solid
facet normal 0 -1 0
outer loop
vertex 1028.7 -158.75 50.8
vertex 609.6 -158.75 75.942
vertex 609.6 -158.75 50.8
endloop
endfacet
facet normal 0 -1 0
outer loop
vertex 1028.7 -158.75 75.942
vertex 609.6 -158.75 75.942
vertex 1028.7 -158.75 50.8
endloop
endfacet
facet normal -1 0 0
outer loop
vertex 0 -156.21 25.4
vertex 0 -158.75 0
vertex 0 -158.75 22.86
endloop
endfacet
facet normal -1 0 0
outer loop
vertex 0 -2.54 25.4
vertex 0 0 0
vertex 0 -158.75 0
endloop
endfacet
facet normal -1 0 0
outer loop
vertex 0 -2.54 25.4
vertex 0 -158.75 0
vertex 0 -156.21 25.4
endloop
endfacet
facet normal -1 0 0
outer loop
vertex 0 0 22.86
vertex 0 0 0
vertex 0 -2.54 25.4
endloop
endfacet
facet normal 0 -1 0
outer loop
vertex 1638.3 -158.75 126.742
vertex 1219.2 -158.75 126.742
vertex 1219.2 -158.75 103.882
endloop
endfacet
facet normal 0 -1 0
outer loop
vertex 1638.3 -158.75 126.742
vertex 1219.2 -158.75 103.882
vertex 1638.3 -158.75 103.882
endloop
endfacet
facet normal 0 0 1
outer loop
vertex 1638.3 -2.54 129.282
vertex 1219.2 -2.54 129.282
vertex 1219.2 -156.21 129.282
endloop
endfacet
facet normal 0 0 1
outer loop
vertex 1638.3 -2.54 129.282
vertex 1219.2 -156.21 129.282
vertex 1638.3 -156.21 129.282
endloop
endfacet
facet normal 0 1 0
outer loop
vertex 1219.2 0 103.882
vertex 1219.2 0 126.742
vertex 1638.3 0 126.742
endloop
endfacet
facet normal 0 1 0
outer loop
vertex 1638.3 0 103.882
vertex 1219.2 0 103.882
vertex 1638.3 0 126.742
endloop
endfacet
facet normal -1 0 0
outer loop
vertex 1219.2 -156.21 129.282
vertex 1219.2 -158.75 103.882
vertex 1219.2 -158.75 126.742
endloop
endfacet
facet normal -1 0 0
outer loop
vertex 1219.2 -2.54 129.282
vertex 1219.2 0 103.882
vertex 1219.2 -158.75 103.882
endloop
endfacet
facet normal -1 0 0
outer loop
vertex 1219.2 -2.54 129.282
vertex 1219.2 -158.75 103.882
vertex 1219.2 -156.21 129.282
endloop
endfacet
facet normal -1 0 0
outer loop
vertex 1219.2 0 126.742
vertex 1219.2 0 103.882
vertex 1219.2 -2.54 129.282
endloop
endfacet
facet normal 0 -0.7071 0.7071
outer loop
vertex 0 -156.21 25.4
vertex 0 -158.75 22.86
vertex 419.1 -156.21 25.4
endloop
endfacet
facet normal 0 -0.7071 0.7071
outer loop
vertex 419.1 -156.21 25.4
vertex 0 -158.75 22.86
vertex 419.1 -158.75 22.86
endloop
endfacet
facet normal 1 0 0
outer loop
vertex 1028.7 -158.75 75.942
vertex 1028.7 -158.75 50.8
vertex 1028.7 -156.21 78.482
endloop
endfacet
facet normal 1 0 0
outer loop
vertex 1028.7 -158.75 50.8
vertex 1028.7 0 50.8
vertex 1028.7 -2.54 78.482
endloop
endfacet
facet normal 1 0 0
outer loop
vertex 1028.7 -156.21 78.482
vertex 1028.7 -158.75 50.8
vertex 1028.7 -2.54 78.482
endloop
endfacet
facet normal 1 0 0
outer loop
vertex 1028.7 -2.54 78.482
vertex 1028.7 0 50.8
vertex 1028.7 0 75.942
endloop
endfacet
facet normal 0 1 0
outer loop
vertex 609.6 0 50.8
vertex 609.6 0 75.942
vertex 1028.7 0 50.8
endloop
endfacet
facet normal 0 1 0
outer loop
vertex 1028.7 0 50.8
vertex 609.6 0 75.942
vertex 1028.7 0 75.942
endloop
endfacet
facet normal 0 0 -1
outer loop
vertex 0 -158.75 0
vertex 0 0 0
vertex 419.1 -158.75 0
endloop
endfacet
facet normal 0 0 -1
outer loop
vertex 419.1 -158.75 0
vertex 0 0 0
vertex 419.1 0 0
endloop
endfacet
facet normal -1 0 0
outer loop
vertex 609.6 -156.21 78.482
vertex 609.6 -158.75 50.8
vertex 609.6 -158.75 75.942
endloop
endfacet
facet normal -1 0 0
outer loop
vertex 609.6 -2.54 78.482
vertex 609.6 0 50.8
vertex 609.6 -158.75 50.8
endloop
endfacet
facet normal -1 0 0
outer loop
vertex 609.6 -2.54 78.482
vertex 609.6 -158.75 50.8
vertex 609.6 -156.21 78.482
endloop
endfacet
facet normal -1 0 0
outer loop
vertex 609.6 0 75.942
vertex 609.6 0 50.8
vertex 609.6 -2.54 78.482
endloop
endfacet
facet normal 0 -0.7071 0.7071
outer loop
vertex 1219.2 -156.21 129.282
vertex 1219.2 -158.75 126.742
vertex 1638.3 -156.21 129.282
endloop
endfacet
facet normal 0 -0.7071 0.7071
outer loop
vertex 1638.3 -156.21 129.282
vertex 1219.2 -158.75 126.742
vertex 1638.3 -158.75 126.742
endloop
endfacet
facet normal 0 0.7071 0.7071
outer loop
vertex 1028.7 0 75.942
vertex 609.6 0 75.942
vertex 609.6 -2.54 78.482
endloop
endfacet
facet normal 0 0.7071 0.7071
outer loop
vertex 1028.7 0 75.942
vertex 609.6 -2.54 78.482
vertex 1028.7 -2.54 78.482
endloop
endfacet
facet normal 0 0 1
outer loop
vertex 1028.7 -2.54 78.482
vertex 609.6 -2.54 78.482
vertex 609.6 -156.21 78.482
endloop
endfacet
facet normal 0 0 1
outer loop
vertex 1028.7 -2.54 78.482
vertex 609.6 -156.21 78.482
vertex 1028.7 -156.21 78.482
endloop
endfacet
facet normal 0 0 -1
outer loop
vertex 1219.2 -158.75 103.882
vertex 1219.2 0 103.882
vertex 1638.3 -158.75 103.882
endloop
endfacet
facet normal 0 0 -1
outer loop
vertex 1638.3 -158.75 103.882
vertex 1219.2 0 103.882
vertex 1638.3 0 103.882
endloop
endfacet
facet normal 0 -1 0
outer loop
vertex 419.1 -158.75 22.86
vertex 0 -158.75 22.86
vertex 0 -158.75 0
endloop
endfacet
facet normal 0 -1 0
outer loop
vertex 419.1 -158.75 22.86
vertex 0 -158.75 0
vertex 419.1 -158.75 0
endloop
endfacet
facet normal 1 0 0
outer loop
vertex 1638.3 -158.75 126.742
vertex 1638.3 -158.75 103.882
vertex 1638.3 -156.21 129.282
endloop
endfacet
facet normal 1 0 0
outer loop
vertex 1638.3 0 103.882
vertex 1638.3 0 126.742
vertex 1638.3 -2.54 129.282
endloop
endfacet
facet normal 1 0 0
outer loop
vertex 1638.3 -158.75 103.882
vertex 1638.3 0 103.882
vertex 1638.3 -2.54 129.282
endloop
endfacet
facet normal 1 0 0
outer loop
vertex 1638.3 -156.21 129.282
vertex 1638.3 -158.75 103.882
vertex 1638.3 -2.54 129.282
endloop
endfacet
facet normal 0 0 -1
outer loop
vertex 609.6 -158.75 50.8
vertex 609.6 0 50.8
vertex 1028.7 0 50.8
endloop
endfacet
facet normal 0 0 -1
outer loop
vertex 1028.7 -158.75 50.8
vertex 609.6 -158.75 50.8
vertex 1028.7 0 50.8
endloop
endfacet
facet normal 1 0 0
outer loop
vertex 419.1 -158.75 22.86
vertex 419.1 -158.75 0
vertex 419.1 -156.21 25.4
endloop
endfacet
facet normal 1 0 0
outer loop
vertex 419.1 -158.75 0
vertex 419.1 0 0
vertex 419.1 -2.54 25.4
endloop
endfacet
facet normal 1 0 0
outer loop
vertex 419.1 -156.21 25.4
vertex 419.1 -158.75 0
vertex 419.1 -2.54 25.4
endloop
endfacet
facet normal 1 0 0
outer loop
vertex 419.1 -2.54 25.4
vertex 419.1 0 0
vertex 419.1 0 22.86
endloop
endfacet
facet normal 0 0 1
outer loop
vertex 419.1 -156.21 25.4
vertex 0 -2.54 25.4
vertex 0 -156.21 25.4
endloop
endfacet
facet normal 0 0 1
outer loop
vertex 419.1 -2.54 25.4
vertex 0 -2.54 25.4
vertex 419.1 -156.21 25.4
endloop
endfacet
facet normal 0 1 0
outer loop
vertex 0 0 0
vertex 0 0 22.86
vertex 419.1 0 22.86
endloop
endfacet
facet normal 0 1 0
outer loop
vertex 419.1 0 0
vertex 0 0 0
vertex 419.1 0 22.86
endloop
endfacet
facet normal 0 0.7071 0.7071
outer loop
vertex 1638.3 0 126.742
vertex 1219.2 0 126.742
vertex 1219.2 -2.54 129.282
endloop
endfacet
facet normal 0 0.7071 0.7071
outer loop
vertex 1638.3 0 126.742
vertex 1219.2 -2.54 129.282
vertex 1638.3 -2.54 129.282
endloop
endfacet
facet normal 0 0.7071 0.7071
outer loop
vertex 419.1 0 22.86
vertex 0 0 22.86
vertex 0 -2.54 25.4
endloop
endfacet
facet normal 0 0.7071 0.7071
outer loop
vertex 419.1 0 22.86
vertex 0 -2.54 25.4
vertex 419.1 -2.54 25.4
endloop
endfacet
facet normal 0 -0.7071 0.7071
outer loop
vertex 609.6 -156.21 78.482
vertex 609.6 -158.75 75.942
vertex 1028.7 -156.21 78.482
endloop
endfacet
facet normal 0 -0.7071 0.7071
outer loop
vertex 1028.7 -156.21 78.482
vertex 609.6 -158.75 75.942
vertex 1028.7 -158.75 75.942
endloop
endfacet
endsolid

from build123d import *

# Parameters (mm, degrees)
F0_W     = 419.1
F0_H     = 25.4
F0_H_2   = 27.682158
F1_DEPTH = 158.75
F2_SIZE  = 2.54


with BuildPart() as f1:
    # F0 (on Front) → F1 (new body)
    with BuildSketch(Plane.XZ):
        with Locations((209.55, 12.7)):
            Rectangle(F0_W, F0_H)
        with Locations((819.15, 64.641079)):
            Rectangle(F0_W, F0_H_2)
        with Locations((1428.75, 116.582158)):
            Rectangle(F0_W, F0_H)
    extrude(amount=F1_DEPTH)

    # F2
    f2_edges = [f1.edges().sort_by_distance(p)[0] for p in [
        (209.55, -158.75, 25.4),
        (819.15, -158.75, 78.482158),
        (1428.75, -158.75, 129.282158),
        (1428.75, 0, 129.282158),
        (819.15, 0, 78.482158),
        (209.55, 0, 25.4),
    ]]
    chamfer(f2_edges, length=F2_SIZE)


solid = f1.part
